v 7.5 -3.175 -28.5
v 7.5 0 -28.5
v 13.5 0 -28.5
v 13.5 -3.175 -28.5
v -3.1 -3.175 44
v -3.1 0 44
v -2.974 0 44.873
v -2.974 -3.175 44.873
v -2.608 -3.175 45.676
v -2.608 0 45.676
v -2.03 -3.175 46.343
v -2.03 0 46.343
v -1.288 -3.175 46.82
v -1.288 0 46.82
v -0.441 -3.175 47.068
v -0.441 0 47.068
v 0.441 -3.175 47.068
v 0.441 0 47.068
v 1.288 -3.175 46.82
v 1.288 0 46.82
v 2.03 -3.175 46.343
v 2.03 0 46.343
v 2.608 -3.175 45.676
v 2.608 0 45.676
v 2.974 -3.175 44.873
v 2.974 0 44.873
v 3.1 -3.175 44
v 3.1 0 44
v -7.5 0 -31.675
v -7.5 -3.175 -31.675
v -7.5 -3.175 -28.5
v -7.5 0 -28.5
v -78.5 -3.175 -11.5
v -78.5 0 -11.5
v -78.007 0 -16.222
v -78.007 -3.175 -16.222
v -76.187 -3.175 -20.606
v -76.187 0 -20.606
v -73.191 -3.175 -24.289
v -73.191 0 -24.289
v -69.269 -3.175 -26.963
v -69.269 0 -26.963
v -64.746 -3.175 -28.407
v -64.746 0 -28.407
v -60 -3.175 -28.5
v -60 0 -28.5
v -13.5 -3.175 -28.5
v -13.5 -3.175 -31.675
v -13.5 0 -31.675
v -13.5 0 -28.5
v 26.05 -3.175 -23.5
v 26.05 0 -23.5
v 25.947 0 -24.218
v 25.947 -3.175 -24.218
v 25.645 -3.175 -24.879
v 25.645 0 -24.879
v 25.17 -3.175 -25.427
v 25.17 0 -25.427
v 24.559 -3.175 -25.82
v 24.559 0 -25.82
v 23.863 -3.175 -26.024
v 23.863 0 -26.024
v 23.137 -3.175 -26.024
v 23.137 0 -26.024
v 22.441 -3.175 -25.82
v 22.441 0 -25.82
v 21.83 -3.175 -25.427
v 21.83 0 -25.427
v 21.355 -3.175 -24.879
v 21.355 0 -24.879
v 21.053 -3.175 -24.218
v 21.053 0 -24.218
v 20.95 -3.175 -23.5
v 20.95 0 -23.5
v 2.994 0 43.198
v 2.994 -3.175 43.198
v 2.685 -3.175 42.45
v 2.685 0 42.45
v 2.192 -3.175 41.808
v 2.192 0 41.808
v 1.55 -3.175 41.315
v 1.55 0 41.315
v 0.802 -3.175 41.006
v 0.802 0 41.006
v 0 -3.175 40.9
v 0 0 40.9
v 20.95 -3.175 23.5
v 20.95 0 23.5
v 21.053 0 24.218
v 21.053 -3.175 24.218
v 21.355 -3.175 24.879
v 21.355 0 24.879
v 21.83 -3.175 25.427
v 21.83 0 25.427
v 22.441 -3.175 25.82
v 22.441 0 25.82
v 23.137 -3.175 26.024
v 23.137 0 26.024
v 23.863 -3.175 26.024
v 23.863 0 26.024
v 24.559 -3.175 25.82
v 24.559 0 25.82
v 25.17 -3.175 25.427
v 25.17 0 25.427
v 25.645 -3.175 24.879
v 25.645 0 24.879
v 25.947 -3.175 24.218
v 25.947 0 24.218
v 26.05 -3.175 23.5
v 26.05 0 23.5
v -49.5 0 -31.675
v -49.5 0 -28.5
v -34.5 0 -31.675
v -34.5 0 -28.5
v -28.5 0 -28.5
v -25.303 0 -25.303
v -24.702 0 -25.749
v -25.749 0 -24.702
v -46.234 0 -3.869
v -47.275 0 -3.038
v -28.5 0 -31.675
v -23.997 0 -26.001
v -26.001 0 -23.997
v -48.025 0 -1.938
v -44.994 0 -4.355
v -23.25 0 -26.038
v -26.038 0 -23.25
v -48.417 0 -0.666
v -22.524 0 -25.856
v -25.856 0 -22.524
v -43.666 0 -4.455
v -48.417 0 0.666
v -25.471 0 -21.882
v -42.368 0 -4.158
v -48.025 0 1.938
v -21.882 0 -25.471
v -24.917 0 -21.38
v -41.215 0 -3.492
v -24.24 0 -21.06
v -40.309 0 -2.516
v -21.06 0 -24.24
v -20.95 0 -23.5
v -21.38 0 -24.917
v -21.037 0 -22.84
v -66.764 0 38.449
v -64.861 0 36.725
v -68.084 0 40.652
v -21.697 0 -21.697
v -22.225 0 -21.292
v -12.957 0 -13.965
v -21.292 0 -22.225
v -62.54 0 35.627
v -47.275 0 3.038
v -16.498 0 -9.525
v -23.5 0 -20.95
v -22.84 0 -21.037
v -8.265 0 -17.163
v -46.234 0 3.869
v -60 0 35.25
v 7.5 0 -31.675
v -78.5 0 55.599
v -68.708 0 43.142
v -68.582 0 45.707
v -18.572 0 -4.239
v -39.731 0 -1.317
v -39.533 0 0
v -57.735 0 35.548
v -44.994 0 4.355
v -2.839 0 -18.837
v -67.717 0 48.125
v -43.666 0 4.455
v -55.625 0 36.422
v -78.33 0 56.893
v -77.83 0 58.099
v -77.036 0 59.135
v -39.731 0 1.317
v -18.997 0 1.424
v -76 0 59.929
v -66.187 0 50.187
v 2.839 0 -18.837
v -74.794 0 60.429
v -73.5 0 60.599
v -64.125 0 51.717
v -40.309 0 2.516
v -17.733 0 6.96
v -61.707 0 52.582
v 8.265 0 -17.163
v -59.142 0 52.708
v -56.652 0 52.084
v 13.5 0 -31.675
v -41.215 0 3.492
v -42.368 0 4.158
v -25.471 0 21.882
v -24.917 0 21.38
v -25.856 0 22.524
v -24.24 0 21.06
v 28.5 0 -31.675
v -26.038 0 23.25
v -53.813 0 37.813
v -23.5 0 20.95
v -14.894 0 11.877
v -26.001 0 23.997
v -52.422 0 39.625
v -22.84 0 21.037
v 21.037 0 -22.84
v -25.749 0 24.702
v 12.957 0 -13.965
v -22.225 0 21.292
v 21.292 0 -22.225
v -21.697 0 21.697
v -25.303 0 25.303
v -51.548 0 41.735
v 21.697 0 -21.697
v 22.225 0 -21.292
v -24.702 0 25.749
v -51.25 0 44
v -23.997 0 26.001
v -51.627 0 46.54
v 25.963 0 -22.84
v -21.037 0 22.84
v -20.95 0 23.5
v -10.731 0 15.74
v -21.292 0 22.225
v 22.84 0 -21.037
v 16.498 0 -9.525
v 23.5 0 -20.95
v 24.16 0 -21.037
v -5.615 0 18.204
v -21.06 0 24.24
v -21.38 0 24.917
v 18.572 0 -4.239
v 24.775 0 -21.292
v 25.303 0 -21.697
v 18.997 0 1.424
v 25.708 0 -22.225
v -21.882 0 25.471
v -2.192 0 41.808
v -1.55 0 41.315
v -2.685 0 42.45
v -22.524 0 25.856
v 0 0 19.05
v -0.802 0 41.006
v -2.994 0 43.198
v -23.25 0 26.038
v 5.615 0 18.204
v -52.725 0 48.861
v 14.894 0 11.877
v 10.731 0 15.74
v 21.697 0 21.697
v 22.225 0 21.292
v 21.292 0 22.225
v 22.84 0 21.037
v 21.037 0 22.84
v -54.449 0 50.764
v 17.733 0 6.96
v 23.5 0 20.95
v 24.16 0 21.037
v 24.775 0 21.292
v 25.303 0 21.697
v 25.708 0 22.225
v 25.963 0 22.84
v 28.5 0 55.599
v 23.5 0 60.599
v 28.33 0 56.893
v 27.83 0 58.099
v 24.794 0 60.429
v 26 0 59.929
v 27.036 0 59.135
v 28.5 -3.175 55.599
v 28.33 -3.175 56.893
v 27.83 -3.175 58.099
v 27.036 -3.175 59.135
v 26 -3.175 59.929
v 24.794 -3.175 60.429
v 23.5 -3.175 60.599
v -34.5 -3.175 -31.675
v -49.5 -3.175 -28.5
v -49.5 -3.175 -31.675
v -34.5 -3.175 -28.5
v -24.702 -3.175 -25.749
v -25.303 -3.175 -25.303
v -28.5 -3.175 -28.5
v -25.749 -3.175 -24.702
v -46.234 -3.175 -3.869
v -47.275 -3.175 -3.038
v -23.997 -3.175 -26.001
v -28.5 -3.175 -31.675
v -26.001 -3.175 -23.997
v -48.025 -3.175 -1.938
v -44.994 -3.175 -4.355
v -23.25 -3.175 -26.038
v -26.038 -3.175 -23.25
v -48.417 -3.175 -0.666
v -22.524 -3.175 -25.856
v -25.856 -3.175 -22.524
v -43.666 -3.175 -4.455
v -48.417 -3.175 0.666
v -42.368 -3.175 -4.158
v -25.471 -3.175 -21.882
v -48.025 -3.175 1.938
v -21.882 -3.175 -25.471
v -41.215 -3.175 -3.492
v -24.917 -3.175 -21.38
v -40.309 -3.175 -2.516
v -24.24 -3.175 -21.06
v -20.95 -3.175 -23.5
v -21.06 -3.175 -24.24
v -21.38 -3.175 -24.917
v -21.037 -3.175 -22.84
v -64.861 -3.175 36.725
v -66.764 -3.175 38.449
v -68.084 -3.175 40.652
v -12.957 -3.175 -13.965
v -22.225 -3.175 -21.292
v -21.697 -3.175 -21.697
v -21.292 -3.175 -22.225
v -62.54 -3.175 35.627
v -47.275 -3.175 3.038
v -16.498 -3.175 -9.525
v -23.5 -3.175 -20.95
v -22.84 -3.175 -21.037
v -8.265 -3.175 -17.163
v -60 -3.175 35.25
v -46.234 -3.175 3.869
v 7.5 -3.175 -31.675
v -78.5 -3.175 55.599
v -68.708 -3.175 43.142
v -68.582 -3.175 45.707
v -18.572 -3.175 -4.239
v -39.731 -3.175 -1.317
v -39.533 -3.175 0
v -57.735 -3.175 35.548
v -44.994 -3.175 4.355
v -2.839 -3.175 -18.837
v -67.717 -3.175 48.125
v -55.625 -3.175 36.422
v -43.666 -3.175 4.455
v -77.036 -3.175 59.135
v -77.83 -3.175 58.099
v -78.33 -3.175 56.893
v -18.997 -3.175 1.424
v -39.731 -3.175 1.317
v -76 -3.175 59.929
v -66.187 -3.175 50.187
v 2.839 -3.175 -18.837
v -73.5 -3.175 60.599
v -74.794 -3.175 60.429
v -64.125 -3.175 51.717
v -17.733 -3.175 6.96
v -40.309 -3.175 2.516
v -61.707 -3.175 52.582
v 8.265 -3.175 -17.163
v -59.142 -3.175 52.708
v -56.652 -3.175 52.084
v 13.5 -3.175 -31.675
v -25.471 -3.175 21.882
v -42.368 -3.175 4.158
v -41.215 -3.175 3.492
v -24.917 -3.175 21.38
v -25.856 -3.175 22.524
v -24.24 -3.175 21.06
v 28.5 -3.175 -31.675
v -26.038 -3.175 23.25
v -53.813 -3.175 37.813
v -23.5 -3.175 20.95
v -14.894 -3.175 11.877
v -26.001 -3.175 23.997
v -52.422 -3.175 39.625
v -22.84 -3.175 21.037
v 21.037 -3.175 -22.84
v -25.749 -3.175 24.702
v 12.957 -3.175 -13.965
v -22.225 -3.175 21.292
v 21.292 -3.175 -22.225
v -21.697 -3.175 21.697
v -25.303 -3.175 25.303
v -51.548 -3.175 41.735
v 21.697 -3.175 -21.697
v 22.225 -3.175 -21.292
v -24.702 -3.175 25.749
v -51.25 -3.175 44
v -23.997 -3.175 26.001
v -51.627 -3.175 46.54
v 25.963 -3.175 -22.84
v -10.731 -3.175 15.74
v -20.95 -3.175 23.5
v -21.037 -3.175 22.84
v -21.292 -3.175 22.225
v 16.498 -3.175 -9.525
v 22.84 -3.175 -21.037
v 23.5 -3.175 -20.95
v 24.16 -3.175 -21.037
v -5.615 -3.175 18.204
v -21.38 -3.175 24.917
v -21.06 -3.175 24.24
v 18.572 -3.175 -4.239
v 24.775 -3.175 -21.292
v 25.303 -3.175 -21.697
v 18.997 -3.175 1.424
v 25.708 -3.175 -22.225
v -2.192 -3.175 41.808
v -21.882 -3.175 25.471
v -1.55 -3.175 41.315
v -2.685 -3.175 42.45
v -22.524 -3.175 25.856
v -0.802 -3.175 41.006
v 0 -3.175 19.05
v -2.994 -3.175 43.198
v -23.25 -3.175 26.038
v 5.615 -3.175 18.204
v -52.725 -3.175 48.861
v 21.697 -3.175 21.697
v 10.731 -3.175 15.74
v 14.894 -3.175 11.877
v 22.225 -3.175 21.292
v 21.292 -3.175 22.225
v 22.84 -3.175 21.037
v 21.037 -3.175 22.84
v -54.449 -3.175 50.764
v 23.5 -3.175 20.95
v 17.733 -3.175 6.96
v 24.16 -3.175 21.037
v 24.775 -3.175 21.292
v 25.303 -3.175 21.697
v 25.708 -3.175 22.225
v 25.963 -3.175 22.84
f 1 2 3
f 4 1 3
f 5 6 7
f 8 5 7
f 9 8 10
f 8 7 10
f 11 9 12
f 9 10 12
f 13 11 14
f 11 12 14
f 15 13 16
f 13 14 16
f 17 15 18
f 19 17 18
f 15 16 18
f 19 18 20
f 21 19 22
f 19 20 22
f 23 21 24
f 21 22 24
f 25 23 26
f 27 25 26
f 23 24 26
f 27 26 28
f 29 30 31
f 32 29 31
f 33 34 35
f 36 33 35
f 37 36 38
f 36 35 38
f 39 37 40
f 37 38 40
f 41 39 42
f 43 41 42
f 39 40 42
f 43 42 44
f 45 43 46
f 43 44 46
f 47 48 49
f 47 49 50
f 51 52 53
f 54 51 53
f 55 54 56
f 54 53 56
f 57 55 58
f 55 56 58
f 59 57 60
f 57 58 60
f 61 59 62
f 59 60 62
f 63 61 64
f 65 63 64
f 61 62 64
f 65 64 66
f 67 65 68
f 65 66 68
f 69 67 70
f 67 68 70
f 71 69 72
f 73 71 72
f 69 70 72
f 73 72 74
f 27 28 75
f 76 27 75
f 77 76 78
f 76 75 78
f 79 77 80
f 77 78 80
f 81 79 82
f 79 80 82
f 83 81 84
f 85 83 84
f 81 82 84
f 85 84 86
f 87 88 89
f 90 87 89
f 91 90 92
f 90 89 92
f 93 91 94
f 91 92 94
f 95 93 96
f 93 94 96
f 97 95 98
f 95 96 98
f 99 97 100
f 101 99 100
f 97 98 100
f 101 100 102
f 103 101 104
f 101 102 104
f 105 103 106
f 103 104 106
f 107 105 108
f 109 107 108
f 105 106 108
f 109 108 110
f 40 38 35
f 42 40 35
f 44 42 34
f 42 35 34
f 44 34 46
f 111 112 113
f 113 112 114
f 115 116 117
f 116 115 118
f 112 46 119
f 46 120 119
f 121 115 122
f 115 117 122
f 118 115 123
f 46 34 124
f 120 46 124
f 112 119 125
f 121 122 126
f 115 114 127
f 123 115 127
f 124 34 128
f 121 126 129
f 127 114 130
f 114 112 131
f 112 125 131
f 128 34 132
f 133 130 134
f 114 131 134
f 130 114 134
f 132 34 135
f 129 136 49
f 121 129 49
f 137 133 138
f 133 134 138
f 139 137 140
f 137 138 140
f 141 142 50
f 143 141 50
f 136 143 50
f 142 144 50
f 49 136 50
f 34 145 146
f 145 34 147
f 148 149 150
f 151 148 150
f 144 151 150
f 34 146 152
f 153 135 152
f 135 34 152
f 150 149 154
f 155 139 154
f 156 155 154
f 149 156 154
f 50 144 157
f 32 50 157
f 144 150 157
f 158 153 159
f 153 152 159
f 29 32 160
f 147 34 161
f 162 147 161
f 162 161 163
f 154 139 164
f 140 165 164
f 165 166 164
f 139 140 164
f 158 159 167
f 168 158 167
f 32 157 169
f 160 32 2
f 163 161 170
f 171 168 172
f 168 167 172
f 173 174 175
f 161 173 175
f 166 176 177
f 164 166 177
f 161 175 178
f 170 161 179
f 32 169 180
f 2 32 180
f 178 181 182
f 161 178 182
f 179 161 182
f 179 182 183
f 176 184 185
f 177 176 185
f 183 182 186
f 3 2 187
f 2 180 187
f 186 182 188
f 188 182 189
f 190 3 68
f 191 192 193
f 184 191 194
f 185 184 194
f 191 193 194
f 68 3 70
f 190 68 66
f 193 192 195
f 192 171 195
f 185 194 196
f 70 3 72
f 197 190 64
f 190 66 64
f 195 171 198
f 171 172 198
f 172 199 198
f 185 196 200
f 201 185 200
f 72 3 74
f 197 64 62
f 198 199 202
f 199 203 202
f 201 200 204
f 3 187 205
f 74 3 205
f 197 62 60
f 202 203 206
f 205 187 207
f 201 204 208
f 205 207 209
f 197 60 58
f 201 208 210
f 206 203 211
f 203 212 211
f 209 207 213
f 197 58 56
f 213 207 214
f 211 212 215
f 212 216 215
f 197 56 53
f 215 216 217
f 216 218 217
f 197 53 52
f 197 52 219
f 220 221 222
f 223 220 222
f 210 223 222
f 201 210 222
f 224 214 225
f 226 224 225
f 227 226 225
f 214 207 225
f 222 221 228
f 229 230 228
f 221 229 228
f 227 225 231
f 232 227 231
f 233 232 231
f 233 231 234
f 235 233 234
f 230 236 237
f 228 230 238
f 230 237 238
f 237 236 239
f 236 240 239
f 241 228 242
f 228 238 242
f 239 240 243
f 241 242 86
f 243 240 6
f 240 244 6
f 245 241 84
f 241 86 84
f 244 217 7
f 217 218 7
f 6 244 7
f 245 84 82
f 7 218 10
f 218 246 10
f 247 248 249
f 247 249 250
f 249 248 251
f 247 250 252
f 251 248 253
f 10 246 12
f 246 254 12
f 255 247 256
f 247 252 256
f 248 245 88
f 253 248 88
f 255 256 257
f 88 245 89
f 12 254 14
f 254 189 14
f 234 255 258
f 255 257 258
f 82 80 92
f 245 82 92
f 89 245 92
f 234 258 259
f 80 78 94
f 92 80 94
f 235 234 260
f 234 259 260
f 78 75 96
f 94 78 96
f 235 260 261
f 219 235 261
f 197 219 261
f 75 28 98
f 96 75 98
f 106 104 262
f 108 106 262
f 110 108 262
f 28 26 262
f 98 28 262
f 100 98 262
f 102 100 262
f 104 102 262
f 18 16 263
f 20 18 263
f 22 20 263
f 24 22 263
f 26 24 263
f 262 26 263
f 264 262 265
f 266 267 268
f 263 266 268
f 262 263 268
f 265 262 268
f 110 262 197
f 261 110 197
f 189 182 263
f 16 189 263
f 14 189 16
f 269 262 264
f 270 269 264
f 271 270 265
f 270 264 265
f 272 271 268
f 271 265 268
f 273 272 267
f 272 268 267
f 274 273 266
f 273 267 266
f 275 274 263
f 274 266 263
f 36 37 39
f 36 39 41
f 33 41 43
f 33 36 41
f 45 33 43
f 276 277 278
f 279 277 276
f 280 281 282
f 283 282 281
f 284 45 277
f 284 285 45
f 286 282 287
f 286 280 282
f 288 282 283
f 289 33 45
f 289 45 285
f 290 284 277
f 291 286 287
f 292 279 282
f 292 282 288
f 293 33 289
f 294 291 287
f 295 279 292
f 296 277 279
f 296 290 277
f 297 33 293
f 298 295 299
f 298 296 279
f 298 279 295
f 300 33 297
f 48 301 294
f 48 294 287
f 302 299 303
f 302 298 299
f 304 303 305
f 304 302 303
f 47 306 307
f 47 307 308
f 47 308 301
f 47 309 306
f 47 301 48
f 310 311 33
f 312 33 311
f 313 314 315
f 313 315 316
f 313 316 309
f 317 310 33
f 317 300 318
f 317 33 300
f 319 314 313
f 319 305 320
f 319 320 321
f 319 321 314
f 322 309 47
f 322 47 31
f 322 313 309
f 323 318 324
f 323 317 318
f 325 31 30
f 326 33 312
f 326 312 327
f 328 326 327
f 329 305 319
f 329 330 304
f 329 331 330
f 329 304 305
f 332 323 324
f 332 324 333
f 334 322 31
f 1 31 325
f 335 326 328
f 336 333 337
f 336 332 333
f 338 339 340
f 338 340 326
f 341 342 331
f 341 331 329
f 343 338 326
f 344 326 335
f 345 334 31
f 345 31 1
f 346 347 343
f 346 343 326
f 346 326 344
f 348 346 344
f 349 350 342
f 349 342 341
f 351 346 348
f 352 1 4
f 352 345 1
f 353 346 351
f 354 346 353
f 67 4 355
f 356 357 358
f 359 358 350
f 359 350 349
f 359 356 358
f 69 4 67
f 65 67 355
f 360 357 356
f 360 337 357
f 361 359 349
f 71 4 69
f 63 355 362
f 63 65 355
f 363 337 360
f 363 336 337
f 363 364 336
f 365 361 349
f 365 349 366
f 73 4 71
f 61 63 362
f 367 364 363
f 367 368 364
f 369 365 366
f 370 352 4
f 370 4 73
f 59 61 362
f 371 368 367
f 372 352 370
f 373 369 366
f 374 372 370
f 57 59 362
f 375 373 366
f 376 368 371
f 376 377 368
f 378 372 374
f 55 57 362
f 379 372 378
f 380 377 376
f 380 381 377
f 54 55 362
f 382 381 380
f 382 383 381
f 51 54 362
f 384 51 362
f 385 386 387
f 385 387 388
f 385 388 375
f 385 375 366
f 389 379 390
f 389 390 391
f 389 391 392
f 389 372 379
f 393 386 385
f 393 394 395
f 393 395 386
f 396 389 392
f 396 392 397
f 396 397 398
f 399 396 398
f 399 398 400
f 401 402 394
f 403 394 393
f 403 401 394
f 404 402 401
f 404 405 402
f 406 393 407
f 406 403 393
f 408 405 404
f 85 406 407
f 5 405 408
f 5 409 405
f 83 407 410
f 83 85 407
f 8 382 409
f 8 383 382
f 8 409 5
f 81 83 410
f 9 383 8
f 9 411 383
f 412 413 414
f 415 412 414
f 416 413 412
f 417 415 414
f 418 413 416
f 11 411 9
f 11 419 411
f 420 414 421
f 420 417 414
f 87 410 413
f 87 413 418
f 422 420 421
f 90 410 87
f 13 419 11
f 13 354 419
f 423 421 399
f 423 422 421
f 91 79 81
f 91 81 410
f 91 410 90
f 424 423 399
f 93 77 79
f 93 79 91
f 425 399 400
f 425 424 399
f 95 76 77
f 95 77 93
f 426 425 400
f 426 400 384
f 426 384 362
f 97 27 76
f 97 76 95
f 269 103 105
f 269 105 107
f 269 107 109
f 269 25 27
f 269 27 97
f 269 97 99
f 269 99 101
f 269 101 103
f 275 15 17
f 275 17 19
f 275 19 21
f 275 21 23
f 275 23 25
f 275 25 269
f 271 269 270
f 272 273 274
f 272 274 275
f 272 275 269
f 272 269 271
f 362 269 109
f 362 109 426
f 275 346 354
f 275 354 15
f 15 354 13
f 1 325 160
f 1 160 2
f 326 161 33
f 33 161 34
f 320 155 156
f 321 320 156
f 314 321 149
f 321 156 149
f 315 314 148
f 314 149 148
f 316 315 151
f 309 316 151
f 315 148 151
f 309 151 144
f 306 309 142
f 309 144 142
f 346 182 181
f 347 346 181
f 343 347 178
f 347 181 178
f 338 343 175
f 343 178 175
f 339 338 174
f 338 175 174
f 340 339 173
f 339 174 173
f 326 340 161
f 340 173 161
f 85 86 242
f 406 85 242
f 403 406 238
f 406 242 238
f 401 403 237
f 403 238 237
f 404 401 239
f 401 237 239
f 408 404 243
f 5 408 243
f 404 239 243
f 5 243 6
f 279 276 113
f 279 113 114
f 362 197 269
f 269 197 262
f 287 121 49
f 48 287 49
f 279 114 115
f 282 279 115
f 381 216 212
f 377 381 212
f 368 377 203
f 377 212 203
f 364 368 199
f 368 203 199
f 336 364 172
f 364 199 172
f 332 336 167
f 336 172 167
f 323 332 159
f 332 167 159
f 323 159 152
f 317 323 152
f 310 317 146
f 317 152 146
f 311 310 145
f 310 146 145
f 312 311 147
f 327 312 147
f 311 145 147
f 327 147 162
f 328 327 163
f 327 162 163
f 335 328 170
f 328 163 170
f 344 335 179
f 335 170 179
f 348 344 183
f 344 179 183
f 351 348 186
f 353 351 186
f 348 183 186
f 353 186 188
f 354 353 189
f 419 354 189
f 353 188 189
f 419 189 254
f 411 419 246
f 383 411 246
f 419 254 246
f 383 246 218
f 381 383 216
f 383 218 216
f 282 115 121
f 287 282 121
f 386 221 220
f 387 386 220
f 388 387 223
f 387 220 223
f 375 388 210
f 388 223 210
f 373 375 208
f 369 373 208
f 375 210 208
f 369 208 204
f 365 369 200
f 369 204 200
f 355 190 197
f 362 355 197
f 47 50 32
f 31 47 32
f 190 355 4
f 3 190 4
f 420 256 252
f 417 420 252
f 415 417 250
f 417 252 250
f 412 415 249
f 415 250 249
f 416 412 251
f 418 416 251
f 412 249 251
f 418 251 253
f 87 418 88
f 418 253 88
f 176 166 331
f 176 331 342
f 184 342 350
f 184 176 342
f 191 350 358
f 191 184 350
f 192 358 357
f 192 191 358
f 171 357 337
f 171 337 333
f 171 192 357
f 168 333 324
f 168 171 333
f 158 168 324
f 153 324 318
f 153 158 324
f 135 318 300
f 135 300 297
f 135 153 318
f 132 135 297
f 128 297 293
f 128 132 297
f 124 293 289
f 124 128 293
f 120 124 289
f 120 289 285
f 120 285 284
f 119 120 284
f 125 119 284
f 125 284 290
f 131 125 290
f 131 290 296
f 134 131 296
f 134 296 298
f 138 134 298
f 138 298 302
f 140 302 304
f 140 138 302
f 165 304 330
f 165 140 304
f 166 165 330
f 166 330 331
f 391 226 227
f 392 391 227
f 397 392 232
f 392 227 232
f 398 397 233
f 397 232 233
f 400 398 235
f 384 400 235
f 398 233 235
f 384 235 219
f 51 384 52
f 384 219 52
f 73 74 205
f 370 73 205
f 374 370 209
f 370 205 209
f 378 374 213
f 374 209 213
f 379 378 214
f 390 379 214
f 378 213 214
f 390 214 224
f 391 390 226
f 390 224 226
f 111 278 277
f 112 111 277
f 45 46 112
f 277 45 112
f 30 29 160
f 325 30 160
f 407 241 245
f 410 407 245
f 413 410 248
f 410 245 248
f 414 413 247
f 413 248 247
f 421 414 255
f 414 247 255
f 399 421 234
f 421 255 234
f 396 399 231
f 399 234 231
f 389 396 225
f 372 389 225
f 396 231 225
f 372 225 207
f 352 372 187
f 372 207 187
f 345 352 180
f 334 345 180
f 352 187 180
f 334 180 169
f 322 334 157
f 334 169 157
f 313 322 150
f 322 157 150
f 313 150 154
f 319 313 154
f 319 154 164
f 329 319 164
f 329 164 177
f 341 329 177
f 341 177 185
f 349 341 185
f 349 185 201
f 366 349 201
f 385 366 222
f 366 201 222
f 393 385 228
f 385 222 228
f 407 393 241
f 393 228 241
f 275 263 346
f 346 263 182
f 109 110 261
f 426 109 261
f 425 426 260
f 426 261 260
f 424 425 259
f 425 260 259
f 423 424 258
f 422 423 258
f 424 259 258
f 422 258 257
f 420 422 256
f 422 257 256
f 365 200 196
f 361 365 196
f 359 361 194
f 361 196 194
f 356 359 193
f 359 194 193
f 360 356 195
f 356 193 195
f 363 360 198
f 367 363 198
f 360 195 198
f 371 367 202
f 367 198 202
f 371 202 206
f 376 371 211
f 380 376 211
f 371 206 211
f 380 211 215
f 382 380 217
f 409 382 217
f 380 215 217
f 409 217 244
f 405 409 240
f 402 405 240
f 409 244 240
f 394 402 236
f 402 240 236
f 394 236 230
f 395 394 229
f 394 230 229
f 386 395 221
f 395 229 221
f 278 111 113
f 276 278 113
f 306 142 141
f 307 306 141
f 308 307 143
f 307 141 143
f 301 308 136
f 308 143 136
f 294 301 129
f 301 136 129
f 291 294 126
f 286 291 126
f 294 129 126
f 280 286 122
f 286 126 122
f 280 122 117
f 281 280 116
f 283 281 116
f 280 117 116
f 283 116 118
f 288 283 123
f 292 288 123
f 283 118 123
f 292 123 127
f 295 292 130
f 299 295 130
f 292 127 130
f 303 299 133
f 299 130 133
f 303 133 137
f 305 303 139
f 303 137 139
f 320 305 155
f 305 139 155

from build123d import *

# Parameters (mm, degrees)
F0_W     = 15
F0_H     = 3.175
F0_W_2   = 7.5
F0_R     = 4.4670073426
F1_DEPTH = 3.175


# Not quite as in the source:
# - a feature names something its author has since deleted; it is built from what else it names


with BuildPart() as f1:
    # F0 (on Front) → F1 (new body)
    with BuildSketch(Plane.XZ):
        with BuildLine():
            Line((0, 19.05), (0, 23.5))
            Line((0, 23.5), (-20.95, 23.5))
            ThreePointArc((-20.95, 23.5), (-21.696877708, 21.696877708), (-23.5, 20.95))
            Line((-23.5, 20.95), (-23.5, 0))
            Line((-23.5, 0), (-19.05, 0))
            ThreePointArc((-19.05, 0), (-13.4703841816, 13.4703841816), (0, 19.05))
        make_face()
        with BuildLine():
            Line((20.95, 23.5), (0, 23.5))
            Line((0, 23.5), (0, 19.05))
            ThreePointArc((0, 19.05), (13.4703841816, 13.4703841816), (19.05, 0))
            ThreePointArc((19.05, 0), (0, -19.05), (-19.05, 0))
            Line((-19.05, 0), (-23.5, 0))
            Line((-23.5, 0), (-23.5, -20.95))
            ThreePointArc((-23.5, -20.95), (-21.696877708, -21.696877708), (-20.95, -23.5))
            Line((-20.95, -23.5), (20.95, -23.5))
            ThreePointArc((20.95, -23.5), (21.696877708, -21.696877708), (23.5, -20.95))
            Line((23.5, -20.95), (23.5, 20.95))
            ThreePointArc((23.5, 20.95), (21.696877708, 21.696877708), (20.95, 23.5))
        make_face()
        with Locations((21, -30.0875)):
            Rectangle(F0_W, F0_H)
        with Locations((3.75, -30.0875)):
            Rectangle(F0_W_2, F0_H)
        with Locations((-3.75, -30.0875)):
            Rectangle(F0_W_2, F0_H)
        with Locations((-21, -30.0875)):
            Rectangle(F0_W, F0_H)
        with BuildLine():
            Line((0, 28.5), (-28.5, 28.5))
            Line((-28.5, 28.5), (-28.5, 0))
            Line((-28.5, 0), (-23.5, 0))
            Line((-23.5, 0), (-23.5, 20.95))
            ThreePointArc((-23.5, 20.95), (-25.303122292, 25.303122292), (-20.95, 23.5))
            Line((-20.95, 23.5), (0, 23.5))
            Line((0, 23.5), (0, 28.5))
        make_face()
        with BuildLine():
            Line((23.5, 28.5), (0, 28.5))
            Line((0, 28.5), (0, 23.5))
            Line((0, 23.5), (20.95, 23.5))
            ThreePointArc((20.95, 23.5), (23.5, 26.05), (26.05, 23.5))
            ThreePointArc((26.05, 23.5), (25.303122292, 21.696877708), (23.5, 20.95))
            Line((23.5, 20.95), (23.5, -20.95))
            ThreePointArc((23.5, -20.95), (25.303122292, -21.696877708), (26.05, -23.5))
            ThreePointArc((26.05, -23.5), (23.5, -26.05), (20.95, -23.5))
            Line((20.95, -23.5), (-20.95, -23.5))
            ThreePointArc((-20.95, -23.5), (-25.303122292, -25.303122292), (-23.5, -20.95))
            Line((-23.5, -20.95), (-23.5, 0))
            Line((-23.5, 0), (-28.5, 0))
            Line((-28.5, 0), (-28.5, -28.5))
            Line((-28.5, -28.5), (-13.5, -28.5))
            Line((-13.5, -28.5), (-7.5, -28.5))
            Line((-7.5, -28.5), (0, -28.5))
            Line((0, -28.5), (7.5, -28.5))
            Line((7.5, -28.5), (13.5, -28.5))
            Line((13.5, -28.5), (28.5, -28.5))
            Line((28.5, -28.5), (28.5, 23.5))
            Line((28.5, 23.5), (28.5, 28.5))
            Line((28.5, 28.5), (23.5, 28.5))
        make_face()
        with BuildLine():
            Line((-51.25, 44), (-28.5, 44))
            Line((-28.5, 44), (-28.5, 60.5991594493))
            Line((-28.5, 60.5991594493), (-73.5, 60.5991594493))
            ThreePointArc((-73.5, 60.5991594493), (-77.0355339059, 59.1346933553), (-78.5, 55.5991594493))
            Line((-78.5, 55.5991594493), (-78.5, -11.5))
            ThreePointArc((-78.5, -11.5), (-73.1911039749, -24.2888484433), (-60, -28.5))
            Line((-60, -28.5), (-60, 35.25))
            ThreePointArc((-60, 35.25), (-66.1871843354, 50.1871843354), (-51.25, 44))
        make_face()
        with BuildLine():
            Line((-28.5, 0), (-28.5, 28.5))
            Line((-28.5, 28.5), (-28.5, 44))
            Line((-28.5, 44), (-51.25, 44))
            ThreePointArc((-51.25, 44), (-53.8128156646, 37.8128156646), (-60, 35.25))
            Line((-60, 35.25), (-60, -28.5))
            Line((-60, -28.5), (-49.5, -28.5))
            Line((-49.5, -28.5), (-34.5, -28.5))
            Line((-34.5, -28.5), (-28.5, -28.5))
            Line((-28.5, -28.5), (-28.5, 0))
        make_face()
        with Locations((-44, 0)):
            Circle(F0_R, mode=Mode.SUBTRACT)
        with Locations((-42, -30.0875)):
            Rectangle(F0_W, F0_H)
        with BuildLine():
            Line((-28.5, 44), (-28.5, 28.5))
            Line((-28.5, 28.5), (0, 28.5))
            Line((0, 28.5), (0, 40.9))
            ThreePointArc((0, 40.9), (-2.1920310217, 41.8079689783), (-3.1, 44))
            Line((-3.1, 44), (-28.5, 44))
        make_face()
        with BuildLine():
            Line((0, 40.9), (0, 28.5))
            Line((0, 28.5), (23.5, 28.5))
            Line((23.5, 28.5), (28.5, 28.5))
            Line((28.5, 28.5), (28.5, 55.5991594493))
            ThreePointArc((28.5, 55.5991594493), (27.0355339059, 59.1346933553), (23.5, 60.5991594493))
            Line((23.5, 60.5991594493), (-28.5, 60.5991594493))
            Line((-28.5, 60.5991594493), (-28.5, 44))
            Line((-28.5, 44), (-3.1, 44))
            ThreePointArc((-3.1, 44), (0, 47.1), (3.1, 44))
            ThreePointArc((3.1, 44), (2.1920310217, 41.8079689783), (0, 40.9))
        make_face()
    extrude(amount=F1_DEPTH)


solid = f1.part
